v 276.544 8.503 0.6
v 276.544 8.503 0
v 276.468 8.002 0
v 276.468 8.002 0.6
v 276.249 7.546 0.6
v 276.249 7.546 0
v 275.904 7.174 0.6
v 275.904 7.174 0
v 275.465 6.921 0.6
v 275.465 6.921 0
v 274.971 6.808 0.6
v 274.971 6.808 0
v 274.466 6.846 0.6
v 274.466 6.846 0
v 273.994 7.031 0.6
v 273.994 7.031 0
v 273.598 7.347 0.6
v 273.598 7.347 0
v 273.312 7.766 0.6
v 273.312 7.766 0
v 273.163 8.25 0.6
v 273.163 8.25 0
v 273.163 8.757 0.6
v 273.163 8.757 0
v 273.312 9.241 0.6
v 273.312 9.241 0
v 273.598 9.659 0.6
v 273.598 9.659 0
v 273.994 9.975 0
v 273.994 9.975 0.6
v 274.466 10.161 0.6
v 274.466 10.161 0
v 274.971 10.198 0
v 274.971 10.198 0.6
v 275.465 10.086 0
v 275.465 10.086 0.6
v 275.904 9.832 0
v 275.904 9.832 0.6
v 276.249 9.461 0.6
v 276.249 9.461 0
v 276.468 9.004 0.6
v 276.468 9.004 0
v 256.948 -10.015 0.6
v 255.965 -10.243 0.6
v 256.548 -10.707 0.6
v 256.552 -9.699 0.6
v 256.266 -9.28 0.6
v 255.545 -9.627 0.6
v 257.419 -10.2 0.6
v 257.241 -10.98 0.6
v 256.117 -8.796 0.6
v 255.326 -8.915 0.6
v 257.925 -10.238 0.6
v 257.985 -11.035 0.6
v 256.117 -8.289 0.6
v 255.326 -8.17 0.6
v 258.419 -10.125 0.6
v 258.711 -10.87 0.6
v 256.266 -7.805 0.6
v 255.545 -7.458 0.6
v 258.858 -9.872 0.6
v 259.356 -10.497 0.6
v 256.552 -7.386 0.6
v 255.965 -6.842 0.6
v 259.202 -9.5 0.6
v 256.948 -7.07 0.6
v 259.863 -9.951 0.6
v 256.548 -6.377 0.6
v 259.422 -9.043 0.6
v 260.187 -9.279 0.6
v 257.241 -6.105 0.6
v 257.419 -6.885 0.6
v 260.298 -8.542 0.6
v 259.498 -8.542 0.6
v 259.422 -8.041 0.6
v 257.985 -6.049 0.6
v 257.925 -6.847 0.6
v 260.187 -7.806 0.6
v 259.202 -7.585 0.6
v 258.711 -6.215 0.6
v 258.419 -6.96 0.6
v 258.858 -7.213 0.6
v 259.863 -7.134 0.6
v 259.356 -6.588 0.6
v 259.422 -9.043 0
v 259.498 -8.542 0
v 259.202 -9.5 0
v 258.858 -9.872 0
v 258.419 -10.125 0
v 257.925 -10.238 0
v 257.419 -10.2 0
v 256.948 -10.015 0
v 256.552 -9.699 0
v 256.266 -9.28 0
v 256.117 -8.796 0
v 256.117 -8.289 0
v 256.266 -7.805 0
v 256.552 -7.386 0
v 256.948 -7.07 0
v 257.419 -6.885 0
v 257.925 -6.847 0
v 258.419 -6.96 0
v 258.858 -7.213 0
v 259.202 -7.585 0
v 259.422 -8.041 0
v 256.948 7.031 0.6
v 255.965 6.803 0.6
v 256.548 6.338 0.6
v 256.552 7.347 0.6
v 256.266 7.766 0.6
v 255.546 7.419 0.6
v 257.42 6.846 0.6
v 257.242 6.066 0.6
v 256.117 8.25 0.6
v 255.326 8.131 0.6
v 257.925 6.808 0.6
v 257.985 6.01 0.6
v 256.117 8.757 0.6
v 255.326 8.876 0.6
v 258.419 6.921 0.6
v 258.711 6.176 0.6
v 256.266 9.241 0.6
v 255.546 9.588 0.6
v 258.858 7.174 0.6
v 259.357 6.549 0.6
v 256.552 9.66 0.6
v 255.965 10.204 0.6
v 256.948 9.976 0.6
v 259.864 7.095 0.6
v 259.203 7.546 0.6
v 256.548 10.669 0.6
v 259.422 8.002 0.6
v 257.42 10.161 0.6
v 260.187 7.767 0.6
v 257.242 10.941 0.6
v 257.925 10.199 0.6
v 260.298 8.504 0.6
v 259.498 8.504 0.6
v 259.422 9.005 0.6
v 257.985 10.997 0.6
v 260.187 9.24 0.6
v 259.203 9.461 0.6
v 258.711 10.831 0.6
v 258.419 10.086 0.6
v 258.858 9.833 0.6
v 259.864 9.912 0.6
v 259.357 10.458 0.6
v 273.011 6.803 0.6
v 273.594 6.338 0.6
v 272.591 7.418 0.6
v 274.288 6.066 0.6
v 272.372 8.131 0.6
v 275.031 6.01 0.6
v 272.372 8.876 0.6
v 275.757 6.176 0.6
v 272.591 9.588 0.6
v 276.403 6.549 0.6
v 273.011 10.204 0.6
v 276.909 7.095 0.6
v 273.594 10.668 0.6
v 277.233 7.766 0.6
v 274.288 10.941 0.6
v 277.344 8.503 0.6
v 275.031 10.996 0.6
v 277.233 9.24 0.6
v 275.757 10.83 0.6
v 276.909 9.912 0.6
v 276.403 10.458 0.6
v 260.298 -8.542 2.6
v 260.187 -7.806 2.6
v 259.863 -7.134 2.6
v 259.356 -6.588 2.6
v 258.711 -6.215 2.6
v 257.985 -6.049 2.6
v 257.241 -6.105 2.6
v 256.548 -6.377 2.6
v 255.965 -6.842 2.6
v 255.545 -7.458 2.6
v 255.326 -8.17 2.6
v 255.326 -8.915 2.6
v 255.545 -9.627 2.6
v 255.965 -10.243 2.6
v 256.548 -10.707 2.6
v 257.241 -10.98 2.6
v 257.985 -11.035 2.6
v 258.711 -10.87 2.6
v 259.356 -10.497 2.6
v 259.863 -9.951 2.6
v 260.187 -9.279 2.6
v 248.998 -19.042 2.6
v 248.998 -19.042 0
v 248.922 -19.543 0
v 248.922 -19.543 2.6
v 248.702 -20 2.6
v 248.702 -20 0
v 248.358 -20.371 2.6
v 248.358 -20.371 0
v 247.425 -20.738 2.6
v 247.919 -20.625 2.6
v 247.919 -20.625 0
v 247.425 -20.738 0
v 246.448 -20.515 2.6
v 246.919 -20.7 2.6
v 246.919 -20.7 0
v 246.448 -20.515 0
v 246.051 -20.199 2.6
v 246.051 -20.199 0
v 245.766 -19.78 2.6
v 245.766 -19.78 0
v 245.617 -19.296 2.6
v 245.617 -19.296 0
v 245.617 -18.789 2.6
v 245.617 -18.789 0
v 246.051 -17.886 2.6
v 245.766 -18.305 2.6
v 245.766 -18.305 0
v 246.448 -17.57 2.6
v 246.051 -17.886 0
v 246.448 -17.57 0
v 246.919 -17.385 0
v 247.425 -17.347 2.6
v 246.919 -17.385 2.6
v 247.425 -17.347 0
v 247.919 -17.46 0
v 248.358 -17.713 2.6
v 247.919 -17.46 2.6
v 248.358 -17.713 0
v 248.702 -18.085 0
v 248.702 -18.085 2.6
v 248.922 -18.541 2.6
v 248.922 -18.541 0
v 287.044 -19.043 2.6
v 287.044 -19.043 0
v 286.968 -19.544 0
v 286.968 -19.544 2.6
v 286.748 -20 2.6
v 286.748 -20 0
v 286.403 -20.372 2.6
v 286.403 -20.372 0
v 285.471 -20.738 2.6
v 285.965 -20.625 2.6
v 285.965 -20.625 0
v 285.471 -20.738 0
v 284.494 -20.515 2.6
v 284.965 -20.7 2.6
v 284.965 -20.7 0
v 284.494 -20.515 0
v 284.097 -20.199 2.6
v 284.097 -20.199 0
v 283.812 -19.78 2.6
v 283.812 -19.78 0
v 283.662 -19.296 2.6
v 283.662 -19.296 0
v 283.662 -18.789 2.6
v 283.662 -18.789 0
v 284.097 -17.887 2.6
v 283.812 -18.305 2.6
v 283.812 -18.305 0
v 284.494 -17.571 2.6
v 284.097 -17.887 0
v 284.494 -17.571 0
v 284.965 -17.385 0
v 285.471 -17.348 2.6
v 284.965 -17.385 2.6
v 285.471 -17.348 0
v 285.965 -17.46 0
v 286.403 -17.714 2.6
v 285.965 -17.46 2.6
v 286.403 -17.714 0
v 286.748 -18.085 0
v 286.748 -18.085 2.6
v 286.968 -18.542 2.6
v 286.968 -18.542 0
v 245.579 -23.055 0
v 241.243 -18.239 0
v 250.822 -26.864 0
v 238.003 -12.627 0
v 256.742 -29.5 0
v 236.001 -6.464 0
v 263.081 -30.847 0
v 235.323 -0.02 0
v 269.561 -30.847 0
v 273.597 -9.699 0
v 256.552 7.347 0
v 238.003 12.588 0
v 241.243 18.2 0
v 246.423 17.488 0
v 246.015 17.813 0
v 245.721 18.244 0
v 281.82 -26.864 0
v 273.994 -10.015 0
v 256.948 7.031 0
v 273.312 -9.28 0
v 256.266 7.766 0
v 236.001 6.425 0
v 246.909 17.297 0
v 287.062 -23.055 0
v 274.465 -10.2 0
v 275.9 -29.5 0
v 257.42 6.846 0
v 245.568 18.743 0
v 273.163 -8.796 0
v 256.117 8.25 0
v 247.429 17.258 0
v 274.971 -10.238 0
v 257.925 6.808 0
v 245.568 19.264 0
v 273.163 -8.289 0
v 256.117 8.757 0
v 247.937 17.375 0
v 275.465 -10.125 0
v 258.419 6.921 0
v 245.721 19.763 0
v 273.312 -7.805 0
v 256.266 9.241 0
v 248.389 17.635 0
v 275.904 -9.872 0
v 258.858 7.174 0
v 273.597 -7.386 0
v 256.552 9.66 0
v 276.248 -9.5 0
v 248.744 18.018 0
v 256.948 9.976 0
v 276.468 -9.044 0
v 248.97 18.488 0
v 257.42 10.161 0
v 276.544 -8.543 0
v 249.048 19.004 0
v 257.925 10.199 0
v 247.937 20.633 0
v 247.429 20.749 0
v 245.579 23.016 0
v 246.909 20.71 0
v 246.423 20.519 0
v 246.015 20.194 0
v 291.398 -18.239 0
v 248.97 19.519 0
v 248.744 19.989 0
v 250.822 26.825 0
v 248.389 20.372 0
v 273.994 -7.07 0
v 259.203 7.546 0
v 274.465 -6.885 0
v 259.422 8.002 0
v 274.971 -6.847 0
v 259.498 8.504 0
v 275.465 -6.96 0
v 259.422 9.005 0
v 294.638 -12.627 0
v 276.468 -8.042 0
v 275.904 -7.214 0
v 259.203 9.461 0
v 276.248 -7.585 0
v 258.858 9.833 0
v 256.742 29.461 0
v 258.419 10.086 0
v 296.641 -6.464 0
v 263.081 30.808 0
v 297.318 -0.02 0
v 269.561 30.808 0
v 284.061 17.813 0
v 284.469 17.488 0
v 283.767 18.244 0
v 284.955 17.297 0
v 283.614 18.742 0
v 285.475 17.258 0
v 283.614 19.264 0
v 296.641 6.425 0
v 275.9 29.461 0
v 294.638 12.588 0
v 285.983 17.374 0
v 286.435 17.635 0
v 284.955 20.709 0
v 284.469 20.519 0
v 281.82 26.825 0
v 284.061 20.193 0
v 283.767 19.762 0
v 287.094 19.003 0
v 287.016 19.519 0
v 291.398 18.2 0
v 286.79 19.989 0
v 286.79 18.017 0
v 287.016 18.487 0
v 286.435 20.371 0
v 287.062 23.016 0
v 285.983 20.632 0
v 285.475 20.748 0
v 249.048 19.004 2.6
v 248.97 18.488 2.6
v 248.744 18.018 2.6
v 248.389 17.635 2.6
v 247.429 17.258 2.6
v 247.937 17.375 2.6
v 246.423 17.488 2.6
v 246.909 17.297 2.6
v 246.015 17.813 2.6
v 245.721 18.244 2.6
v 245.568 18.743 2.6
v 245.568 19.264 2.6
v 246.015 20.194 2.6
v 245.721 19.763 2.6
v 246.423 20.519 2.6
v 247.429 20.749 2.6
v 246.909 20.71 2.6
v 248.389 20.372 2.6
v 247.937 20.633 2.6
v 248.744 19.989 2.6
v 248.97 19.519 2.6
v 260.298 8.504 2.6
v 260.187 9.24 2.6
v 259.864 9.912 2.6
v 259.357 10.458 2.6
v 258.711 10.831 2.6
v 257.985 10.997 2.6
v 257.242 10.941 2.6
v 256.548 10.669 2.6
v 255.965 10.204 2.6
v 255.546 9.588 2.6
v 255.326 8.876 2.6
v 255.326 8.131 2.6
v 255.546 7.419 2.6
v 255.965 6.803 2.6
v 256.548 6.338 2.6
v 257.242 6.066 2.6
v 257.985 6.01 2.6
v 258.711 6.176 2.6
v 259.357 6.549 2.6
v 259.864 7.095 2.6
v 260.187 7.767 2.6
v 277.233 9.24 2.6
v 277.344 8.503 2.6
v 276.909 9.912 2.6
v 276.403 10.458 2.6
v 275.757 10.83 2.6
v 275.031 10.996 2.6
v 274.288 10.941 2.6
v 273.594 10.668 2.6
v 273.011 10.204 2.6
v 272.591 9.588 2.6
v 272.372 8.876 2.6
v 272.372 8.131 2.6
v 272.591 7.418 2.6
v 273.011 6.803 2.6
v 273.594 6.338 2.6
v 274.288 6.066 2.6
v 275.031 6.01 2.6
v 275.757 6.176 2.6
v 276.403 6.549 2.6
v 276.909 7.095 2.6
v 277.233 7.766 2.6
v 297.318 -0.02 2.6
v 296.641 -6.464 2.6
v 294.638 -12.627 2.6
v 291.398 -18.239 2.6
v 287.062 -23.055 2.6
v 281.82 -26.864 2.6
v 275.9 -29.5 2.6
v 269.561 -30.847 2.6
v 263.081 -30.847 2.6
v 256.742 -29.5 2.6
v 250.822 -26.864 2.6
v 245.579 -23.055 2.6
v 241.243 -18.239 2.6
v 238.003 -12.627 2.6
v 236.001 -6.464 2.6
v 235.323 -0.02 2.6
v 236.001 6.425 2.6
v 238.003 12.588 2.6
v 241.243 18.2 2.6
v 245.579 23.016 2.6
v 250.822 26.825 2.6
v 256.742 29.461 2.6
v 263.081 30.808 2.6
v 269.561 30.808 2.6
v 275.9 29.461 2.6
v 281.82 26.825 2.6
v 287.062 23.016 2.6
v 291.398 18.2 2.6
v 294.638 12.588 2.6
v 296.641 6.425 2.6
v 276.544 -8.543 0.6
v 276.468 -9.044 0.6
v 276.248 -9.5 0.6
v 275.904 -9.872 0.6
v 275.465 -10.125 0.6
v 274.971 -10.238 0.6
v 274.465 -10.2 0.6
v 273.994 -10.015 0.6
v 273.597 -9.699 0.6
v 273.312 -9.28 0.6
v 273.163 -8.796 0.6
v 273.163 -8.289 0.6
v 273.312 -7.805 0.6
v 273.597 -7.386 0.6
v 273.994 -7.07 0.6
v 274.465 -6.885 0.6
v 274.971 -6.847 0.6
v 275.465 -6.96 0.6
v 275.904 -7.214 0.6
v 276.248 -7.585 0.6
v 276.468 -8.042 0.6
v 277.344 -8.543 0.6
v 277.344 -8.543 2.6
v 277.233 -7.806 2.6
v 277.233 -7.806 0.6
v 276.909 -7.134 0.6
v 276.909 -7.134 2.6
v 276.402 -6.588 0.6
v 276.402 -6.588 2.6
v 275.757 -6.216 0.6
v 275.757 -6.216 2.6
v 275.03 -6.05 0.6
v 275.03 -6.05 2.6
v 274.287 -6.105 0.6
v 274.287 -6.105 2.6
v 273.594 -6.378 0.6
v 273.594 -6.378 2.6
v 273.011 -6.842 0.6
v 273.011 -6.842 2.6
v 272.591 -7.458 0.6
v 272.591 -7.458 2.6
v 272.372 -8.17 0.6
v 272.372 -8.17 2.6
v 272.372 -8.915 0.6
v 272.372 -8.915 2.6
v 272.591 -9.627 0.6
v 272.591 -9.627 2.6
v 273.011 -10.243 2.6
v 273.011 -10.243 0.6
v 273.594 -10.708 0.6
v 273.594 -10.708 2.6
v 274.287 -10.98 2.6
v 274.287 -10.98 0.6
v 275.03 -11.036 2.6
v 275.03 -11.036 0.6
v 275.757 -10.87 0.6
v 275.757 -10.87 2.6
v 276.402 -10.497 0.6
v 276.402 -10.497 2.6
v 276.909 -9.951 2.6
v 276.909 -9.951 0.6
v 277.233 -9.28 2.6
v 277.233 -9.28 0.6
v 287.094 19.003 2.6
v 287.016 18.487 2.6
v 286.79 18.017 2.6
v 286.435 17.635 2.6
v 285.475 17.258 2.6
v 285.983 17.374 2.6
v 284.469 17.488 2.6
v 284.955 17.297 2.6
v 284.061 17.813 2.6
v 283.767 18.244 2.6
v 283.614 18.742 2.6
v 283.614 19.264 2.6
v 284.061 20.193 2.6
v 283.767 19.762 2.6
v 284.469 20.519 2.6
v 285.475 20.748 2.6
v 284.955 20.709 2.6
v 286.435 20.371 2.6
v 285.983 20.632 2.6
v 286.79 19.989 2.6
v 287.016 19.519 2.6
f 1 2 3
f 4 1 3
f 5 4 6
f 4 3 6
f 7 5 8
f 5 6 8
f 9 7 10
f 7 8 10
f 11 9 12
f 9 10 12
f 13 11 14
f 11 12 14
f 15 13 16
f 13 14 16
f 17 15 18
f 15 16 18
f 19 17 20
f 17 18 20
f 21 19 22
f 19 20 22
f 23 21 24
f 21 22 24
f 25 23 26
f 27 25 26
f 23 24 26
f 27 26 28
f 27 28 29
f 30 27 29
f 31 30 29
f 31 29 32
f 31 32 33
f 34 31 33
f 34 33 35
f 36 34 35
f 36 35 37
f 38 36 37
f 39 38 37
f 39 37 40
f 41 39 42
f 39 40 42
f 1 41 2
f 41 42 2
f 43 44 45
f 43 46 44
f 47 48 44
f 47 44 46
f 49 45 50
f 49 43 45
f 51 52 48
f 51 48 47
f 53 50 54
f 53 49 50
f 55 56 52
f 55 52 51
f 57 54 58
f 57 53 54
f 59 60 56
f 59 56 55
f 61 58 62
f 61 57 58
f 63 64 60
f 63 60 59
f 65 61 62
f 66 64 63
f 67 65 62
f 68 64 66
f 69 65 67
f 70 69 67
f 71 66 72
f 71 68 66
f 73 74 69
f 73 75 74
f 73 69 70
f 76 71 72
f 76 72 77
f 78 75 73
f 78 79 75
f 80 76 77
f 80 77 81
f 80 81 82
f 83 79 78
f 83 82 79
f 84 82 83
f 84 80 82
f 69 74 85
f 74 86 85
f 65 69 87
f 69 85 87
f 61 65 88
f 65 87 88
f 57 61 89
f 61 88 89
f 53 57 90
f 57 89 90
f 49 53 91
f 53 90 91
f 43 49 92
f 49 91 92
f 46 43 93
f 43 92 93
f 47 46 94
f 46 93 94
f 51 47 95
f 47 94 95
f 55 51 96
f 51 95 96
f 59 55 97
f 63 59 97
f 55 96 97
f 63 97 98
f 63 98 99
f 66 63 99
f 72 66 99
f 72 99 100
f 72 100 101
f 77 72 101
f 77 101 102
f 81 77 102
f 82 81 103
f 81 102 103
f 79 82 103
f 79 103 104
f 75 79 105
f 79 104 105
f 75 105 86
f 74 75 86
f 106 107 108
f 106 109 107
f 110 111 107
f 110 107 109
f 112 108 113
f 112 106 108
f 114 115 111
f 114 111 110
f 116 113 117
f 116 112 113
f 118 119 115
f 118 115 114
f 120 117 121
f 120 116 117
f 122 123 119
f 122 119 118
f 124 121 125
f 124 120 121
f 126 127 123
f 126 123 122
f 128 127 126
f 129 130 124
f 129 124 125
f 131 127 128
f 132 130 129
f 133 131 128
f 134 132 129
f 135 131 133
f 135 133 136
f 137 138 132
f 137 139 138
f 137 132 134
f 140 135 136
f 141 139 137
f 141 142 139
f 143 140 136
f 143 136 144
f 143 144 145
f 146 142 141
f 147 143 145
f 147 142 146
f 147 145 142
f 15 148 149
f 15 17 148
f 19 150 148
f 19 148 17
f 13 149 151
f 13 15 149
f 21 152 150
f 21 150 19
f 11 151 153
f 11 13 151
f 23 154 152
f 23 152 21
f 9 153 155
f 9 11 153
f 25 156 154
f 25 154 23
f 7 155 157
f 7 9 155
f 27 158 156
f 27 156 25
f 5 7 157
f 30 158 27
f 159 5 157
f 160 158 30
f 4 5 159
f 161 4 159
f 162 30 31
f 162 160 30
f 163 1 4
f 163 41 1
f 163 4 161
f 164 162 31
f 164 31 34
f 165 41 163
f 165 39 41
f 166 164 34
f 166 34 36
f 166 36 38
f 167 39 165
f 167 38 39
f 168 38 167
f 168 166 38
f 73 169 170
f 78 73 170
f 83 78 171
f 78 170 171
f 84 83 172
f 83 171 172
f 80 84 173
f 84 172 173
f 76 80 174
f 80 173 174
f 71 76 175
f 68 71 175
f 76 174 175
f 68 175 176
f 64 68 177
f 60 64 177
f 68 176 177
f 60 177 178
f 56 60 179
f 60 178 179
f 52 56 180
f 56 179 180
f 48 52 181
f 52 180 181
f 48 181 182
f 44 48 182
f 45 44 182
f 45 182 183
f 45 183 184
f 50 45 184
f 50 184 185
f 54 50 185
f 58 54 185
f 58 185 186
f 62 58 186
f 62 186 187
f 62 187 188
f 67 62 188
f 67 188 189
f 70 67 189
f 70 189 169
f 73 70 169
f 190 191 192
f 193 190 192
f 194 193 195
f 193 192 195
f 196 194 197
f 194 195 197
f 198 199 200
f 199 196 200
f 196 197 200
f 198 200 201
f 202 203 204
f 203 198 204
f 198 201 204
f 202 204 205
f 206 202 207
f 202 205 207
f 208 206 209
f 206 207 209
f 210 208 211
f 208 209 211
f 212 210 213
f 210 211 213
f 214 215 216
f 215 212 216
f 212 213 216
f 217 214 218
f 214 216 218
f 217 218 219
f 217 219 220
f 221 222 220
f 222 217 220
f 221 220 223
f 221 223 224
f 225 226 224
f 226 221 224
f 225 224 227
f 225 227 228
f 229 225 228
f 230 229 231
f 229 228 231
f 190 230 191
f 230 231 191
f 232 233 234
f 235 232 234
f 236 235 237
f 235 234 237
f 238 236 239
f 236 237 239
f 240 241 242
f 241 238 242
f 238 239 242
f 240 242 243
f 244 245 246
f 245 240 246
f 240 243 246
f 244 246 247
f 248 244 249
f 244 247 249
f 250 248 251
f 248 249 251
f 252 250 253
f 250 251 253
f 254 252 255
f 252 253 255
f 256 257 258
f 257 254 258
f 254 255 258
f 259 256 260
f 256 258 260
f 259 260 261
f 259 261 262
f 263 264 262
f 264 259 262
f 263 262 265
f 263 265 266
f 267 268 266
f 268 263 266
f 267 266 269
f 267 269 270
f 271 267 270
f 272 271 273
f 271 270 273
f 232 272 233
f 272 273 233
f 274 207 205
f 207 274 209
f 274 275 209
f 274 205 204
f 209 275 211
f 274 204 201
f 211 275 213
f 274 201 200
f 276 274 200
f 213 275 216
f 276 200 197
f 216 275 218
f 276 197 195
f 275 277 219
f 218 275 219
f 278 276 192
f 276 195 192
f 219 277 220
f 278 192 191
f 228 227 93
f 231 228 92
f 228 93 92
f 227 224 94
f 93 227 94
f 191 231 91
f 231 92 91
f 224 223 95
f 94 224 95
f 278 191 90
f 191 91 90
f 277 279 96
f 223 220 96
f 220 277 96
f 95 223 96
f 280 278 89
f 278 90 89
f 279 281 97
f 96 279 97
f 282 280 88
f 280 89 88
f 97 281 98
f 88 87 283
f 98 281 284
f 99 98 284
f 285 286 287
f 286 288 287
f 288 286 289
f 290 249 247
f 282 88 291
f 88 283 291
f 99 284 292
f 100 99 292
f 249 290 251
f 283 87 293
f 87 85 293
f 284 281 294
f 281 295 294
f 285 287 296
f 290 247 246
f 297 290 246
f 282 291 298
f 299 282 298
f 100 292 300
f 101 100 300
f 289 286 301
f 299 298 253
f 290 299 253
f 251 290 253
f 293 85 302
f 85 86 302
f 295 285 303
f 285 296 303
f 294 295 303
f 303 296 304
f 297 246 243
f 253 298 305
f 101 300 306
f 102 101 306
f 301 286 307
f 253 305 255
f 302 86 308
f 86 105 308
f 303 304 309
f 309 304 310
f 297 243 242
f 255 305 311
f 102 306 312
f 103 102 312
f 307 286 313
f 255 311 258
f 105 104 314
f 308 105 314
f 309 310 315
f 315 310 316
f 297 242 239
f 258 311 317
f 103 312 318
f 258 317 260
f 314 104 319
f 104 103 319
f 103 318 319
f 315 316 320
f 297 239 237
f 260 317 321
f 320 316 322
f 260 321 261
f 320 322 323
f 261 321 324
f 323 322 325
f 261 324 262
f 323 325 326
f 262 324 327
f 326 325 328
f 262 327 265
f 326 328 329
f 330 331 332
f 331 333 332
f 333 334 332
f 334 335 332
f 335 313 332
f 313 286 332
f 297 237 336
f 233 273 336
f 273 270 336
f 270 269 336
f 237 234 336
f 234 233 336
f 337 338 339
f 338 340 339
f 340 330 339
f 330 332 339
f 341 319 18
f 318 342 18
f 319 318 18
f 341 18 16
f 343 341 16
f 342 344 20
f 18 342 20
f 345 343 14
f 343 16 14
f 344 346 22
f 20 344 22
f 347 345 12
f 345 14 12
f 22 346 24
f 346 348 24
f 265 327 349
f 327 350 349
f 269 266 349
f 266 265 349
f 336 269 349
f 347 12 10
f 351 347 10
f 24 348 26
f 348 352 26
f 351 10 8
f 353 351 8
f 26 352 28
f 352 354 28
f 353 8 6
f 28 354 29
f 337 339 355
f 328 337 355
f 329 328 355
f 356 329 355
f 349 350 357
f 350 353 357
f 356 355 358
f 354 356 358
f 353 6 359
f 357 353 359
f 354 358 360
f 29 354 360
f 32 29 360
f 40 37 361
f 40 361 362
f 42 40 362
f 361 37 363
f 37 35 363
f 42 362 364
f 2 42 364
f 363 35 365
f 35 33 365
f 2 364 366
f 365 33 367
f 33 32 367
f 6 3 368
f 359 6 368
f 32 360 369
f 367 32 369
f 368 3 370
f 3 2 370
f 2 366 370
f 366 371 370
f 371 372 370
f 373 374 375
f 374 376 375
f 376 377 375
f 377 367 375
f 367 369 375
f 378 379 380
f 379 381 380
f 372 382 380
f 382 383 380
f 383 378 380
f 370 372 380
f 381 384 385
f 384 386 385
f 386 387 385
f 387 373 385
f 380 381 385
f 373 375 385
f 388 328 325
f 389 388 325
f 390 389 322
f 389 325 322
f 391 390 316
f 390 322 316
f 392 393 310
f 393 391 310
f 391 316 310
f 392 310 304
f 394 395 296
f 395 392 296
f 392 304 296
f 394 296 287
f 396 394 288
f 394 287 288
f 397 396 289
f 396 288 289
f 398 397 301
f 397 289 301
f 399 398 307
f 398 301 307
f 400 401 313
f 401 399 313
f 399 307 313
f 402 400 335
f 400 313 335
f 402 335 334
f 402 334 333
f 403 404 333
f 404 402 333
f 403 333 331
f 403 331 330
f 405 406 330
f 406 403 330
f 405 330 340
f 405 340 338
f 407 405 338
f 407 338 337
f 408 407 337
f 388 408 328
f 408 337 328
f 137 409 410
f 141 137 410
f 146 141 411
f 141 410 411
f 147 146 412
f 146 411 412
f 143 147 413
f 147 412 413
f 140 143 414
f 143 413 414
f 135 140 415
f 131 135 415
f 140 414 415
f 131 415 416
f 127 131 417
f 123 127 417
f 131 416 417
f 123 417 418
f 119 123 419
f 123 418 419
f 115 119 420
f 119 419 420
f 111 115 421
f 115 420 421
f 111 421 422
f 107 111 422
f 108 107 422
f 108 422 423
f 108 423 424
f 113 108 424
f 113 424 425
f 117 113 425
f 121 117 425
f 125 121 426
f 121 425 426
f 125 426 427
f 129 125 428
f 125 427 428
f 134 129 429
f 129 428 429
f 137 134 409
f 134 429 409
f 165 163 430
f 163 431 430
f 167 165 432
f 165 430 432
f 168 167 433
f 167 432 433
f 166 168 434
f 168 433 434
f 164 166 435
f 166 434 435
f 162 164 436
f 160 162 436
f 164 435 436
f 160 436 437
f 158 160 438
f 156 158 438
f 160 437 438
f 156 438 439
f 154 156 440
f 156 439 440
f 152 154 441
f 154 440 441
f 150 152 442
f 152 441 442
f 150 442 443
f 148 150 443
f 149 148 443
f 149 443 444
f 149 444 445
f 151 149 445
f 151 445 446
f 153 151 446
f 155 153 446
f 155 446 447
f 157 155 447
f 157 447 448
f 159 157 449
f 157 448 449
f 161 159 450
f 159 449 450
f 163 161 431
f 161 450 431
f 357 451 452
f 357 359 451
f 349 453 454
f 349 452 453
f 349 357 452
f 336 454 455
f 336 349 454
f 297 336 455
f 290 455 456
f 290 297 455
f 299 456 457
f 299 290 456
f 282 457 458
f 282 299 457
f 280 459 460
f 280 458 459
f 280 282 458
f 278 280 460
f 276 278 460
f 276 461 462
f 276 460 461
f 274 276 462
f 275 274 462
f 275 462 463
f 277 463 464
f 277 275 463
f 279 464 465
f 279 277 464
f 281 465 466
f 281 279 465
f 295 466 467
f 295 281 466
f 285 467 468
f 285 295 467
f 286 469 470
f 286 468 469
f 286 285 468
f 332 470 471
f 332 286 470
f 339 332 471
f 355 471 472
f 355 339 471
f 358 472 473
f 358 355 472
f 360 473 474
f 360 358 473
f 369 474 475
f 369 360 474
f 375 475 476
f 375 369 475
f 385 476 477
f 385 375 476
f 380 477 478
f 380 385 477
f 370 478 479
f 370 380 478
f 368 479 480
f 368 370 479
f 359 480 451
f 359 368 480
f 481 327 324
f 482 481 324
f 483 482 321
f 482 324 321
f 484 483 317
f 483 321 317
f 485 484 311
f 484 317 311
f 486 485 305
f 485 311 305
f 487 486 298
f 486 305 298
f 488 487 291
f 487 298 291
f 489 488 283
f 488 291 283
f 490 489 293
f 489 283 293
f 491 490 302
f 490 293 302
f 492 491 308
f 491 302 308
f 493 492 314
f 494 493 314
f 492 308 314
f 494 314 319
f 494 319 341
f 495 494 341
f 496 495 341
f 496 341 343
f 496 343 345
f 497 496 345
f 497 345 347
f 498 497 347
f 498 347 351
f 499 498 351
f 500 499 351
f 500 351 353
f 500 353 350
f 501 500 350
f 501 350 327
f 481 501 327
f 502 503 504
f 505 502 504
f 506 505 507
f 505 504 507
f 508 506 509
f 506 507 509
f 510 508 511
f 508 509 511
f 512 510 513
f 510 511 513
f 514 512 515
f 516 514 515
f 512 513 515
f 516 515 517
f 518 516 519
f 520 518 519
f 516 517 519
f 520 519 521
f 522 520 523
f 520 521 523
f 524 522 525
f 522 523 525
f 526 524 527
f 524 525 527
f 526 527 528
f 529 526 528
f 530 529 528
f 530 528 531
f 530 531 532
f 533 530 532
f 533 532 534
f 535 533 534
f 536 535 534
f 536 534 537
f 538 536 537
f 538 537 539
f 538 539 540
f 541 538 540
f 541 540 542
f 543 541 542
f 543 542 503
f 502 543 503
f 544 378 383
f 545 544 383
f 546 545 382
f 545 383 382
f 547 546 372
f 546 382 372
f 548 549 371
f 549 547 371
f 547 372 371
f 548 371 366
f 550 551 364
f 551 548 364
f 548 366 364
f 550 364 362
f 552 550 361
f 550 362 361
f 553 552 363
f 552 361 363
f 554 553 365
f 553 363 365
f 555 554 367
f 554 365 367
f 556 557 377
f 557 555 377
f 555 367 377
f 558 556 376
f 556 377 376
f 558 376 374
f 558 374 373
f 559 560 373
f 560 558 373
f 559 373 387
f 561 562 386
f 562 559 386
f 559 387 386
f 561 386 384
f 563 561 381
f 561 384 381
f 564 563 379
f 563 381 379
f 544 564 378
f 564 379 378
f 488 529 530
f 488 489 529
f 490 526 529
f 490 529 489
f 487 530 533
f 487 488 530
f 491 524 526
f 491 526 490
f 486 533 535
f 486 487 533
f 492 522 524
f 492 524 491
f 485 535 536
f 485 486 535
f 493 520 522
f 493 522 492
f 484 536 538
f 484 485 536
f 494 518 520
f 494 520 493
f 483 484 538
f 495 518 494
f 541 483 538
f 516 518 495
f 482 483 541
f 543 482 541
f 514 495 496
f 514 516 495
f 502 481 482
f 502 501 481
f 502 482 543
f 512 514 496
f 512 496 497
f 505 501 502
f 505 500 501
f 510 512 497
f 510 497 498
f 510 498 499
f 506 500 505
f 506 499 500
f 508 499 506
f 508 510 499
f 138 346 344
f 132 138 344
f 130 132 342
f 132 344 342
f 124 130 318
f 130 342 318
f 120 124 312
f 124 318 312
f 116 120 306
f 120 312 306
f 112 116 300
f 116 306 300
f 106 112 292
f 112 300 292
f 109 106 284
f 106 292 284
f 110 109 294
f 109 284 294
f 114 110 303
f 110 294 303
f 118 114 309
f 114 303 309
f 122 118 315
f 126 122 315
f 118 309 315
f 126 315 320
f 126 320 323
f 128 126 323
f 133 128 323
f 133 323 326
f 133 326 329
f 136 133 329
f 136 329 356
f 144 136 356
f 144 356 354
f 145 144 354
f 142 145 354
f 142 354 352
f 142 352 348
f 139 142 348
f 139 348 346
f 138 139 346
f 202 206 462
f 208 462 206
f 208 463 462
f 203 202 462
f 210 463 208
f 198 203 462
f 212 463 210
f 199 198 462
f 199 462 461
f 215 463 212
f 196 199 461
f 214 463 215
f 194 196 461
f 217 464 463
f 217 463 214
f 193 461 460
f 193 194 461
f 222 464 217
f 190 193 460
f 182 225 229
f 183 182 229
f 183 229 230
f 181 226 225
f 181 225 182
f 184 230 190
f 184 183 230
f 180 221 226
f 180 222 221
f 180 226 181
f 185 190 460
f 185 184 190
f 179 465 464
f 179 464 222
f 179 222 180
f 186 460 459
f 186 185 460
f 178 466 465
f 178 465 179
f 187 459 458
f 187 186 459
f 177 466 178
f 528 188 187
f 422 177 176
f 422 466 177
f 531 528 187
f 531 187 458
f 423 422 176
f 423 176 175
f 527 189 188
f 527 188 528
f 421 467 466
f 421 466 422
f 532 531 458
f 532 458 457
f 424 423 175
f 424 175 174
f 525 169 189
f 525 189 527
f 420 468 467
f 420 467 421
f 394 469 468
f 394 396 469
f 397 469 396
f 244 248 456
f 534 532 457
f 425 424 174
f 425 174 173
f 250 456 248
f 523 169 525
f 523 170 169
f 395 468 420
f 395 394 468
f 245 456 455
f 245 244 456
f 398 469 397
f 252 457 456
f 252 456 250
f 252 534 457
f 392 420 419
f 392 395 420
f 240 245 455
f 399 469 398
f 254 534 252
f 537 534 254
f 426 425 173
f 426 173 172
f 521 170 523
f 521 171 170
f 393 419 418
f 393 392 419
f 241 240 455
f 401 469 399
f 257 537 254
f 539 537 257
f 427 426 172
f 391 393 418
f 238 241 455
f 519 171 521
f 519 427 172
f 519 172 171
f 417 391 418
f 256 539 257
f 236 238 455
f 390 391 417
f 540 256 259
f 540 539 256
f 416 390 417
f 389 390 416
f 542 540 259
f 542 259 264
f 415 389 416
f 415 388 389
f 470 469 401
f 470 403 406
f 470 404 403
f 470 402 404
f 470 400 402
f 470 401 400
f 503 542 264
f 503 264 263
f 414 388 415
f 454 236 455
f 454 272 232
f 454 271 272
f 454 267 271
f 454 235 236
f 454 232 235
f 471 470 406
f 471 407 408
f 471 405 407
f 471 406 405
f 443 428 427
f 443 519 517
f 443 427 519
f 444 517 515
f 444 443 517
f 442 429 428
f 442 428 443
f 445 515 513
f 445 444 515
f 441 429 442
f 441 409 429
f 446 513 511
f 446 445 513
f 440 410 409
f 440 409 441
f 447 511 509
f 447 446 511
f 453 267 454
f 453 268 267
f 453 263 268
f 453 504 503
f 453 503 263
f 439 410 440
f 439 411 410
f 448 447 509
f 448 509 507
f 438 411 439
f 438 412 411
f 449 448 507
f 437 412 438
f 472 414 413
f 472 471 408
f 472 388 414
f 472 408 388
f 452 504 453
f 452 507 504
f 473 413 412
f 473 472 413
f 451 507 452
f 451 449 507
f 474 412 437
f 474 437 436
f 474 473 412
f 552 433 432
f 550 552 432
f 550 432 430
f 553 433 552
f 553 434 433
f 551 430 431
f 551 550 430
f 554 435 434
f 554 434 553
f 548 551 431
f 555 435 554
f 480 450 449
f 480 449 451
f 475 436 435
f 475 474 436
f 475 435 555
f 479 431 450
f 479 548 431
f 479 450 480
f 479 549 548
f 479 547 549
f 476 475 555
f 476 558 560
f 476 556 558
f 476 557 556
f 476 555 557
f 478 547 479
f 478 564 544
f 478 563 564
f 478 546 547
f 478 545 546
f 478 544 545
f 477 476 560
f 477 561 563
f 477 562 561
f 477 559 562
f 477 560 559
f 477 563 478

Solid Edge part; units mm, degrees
sketch "Sketch1" plane through (0, 0, 0) normal (0, 0, 1) x (1, 0, 0)
  circle A0 centre (247.2981, 19.0036) radius 1.75
  circle A1 centre (285.344, 19.0031) radius 1.75
  circle A2 centre (266.3208, -0.0196) radius 30.9975
  circle A3 centre (274.8439, 8.5032) radius 1.7
  circle A4 centre (257.798, 8.5035) radius 1.7
  circle A5 centre (257.7977, -8.5424) radius 1.7
  circle A6 centre (274.8436, -8.5427) radius 1.7
  circle A7 centre (285.3435, -19.0428) radius 1.7
  circle A8 centre (247.2976, -19.0423) radius 1.7
extrude "Protrusion1" add sketch "Sketch1" along normal blind 2.6
sketch "Sketch2" plane through (0, 0, 2.6) normal (0, 0, 1) x (1, 0, 0)
  circle A0 centre (257.798, 8.5035) radius 2.5
  circle A1 centre (274.8439, 8.5032) radius 2.5
  circle A2 centre (274.8436, -8.5427) radius 2.5
  circle A3 centre (257.7977, -8.5424) radius 2.5
extrude "Cutout1" cut sketch "Sketch2" against normal blind 2
